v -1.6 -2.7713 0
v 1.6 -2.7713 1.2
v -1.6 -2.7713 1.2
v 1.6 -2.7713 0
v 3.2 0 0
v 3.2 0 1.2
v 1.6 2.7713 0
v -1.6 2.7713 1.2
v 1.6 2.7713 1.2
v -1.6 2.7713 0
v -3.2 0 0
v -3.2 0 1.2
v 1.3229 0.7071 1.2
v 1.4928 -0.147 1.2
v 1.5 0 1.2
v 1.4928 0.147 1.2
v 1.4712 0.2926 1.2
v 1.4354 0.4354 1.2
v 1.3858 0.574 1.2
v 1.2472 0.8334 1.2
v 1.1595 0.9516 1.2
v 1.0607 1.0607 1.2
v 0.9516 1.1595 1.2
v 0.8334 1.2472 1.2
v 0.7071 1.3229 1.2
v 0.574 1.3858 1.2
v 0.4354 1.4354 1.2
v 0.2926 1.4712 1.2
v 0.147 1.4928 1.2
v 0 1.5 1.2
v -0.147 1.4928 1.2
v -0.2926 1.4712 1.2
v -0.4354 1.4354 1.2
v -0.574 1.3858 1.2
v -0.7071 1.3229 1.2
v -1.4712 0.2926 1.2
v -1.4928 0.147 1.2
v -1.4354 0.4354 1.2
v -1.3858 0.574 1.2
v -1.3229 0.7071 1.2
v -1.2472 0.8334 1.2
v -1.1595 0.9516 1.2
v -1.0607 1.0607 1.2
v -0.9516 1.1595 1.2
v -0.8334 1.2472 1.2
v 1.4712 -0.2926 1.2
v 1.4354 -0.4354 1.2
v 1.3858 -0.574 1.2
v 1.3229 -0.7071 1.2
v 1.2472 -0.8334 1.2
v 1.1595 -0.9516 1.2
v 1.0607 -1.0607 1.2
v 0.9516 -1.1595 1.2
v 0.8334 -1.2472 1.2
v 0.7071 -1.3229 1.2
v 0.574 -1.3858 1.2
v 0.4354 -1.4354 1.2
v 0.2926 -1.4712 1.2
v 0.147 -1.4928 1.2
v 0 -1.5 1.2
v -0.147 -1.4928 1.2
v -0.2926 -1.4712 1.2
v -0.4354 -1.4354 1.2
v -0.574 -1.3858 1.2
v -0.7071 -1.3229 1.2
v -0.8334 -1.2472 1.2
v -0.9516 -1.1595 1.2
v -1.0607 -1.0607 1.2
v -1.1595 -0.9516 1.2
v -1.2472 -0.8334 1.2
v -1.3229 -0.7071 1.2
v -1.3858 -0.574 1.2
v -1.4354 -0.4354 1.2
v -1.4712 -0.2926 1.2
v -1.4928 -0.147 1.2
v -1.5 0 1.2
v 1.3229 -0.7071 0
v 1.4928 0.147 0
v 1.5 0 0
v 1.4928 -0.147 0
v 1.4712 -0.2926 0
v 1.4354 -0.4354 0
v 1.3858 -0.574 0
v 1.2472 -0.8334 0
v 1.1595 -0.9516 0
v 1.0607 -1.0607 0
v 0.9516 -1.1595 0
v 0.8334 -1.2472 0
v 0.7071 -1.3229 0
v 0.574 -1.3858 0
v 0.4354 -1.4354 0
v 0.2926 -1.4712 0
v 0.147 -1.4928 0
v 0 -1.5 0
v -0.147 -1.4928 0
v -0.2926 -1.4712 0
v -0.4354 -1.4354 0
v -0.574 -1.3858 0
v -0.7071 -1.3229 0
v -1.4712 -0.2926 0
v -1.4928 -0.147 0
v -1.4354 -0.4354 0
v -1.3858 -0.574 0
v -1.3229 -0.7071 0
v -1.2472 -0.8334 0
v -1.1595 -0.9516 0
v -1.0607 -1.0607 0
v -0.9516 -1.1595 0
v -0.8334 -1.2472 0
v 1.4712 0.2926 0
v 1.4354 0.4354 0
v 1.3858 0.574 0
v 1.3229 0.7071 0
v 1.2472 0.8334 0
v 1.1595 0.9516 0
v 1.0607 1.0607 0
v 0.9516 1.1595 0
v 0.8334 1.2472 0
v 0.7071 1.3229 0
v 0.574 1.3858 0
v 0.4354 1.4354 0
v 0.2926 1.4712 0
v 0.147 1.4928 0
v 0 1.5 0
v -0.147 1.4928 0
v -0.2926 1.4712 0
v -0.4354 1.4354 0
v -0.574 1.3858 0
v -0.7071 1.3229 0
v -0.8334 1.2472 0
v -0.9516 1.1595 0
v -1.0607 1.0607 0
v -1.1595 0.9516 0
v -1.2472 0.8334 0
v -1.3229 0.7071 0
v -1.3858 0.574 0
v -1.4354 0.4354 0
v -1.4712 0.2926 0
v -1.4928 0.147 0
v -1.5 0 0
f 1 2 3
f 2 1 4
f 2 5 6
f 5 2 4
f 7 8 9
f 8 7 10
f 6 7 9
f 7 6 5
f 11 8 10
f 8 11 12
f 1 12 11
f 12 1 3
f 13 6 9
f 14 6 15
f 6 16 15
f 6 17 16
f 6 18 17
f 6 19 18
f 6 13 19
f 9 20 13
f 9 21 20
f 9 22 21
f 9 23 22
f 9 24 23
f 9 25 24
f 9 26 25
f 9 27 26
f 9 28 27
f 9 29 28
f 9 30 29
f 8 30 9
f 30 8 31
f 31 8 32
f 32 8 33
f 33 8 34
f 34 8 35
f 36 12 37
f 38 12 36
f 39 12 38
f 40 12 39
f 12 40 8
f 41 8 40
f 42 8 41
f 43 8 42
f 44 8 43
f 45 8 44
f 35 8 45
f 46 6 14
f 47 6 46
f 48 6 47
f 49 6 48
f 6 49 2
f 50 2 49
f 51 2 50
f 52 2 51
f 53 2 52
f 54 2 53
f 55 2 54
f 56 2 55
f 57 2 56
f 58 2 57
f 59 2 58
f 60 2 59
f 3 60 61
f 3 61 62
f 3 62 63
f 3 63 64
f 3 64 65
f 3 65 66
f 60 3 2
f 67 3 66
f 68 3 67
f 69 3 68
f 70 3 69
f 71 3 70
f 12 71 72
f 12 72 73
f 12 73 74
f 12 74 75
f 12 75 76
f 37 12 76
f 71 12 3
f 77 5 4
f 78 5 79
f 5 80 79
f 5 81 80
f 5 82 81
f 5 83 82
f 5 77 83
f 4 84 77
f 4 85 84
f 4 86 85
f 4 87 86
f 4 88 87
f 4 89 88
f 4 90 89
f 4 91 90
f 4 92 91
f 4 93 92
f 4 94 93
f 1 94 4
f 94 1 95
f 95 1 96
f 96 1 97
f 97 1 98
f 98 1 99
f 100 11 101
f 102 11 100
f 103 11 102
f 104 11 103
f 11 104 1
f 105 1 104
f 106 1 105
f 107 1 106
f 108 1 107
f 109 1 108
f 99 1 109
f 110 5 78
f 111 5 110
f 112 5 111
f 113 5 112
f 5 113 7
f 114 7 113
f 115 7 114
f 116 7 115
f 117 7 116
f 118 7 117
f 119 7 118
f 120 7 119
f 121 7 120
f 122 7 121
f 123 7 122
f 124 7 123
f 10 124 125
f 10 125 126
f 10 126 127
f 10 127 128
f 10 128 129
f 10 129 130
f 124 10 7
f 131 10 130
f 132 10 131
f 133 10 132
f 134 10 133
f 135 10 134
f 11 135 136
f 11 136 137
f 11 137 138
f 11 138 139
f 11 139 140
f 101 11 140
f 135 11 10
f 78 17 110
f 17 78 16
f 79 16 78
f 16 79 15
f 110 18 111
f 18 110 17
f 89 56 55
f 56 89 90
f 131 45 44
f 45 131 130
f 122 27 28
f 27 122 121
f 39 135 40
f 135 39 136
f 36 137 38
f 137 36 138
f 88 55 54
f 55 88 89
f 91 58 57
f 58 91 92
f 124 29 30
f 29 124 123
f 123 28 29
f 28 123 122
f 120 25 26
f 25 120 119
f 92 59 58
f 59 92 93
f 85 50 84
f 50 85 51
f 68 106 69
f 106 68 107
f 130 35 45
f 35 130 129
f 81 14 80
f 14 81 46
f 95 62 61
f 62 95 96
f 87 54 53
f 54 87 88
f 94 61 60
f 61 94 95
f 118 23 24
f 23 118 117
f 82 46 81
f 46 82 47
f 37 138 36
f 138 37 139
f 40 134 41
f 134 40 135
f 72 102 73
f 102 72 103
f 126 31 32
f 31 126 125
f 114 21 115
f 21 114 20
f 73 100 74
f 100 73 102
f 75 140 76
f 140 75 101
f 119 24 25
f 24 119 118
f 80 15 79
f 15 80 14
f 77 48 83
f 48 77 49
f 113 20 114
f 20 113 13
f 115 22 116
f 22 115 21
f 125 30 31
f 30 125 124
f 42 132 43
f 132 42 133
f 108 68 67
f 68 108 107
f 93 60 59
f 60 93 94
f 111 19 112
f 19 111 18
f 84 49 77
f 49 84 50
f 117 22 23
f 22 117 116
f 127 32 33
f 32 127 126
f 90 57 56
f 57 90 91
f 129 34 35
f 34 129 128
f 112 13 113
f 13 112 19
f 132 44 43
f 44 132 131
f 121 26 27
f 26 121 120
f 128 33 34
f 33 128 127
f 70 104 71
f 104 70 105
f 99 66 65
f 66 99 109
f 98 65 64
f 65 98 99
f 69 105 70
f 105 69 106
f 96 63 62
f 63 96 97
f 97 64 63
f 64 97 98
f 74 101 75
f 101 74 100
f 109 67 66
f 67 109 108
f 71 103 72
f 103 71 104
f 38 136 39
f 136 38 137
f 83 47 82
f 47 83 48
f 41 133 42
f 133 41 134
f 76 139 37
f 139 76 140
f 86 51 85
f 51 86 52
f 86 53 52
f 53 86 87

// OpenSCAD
module hex_nut() {
    difference() {
        // Hexagonal prism for the nut
        scale([1, 1, 2.4/2]) 
            cylinder(d=6.4, h=1, $fn=6);
        // Hole for the screw
        translate([0, 0, -1])
            cylinder(d=3.0, h=4, $fn=64);
    }
}

hex_nut();
